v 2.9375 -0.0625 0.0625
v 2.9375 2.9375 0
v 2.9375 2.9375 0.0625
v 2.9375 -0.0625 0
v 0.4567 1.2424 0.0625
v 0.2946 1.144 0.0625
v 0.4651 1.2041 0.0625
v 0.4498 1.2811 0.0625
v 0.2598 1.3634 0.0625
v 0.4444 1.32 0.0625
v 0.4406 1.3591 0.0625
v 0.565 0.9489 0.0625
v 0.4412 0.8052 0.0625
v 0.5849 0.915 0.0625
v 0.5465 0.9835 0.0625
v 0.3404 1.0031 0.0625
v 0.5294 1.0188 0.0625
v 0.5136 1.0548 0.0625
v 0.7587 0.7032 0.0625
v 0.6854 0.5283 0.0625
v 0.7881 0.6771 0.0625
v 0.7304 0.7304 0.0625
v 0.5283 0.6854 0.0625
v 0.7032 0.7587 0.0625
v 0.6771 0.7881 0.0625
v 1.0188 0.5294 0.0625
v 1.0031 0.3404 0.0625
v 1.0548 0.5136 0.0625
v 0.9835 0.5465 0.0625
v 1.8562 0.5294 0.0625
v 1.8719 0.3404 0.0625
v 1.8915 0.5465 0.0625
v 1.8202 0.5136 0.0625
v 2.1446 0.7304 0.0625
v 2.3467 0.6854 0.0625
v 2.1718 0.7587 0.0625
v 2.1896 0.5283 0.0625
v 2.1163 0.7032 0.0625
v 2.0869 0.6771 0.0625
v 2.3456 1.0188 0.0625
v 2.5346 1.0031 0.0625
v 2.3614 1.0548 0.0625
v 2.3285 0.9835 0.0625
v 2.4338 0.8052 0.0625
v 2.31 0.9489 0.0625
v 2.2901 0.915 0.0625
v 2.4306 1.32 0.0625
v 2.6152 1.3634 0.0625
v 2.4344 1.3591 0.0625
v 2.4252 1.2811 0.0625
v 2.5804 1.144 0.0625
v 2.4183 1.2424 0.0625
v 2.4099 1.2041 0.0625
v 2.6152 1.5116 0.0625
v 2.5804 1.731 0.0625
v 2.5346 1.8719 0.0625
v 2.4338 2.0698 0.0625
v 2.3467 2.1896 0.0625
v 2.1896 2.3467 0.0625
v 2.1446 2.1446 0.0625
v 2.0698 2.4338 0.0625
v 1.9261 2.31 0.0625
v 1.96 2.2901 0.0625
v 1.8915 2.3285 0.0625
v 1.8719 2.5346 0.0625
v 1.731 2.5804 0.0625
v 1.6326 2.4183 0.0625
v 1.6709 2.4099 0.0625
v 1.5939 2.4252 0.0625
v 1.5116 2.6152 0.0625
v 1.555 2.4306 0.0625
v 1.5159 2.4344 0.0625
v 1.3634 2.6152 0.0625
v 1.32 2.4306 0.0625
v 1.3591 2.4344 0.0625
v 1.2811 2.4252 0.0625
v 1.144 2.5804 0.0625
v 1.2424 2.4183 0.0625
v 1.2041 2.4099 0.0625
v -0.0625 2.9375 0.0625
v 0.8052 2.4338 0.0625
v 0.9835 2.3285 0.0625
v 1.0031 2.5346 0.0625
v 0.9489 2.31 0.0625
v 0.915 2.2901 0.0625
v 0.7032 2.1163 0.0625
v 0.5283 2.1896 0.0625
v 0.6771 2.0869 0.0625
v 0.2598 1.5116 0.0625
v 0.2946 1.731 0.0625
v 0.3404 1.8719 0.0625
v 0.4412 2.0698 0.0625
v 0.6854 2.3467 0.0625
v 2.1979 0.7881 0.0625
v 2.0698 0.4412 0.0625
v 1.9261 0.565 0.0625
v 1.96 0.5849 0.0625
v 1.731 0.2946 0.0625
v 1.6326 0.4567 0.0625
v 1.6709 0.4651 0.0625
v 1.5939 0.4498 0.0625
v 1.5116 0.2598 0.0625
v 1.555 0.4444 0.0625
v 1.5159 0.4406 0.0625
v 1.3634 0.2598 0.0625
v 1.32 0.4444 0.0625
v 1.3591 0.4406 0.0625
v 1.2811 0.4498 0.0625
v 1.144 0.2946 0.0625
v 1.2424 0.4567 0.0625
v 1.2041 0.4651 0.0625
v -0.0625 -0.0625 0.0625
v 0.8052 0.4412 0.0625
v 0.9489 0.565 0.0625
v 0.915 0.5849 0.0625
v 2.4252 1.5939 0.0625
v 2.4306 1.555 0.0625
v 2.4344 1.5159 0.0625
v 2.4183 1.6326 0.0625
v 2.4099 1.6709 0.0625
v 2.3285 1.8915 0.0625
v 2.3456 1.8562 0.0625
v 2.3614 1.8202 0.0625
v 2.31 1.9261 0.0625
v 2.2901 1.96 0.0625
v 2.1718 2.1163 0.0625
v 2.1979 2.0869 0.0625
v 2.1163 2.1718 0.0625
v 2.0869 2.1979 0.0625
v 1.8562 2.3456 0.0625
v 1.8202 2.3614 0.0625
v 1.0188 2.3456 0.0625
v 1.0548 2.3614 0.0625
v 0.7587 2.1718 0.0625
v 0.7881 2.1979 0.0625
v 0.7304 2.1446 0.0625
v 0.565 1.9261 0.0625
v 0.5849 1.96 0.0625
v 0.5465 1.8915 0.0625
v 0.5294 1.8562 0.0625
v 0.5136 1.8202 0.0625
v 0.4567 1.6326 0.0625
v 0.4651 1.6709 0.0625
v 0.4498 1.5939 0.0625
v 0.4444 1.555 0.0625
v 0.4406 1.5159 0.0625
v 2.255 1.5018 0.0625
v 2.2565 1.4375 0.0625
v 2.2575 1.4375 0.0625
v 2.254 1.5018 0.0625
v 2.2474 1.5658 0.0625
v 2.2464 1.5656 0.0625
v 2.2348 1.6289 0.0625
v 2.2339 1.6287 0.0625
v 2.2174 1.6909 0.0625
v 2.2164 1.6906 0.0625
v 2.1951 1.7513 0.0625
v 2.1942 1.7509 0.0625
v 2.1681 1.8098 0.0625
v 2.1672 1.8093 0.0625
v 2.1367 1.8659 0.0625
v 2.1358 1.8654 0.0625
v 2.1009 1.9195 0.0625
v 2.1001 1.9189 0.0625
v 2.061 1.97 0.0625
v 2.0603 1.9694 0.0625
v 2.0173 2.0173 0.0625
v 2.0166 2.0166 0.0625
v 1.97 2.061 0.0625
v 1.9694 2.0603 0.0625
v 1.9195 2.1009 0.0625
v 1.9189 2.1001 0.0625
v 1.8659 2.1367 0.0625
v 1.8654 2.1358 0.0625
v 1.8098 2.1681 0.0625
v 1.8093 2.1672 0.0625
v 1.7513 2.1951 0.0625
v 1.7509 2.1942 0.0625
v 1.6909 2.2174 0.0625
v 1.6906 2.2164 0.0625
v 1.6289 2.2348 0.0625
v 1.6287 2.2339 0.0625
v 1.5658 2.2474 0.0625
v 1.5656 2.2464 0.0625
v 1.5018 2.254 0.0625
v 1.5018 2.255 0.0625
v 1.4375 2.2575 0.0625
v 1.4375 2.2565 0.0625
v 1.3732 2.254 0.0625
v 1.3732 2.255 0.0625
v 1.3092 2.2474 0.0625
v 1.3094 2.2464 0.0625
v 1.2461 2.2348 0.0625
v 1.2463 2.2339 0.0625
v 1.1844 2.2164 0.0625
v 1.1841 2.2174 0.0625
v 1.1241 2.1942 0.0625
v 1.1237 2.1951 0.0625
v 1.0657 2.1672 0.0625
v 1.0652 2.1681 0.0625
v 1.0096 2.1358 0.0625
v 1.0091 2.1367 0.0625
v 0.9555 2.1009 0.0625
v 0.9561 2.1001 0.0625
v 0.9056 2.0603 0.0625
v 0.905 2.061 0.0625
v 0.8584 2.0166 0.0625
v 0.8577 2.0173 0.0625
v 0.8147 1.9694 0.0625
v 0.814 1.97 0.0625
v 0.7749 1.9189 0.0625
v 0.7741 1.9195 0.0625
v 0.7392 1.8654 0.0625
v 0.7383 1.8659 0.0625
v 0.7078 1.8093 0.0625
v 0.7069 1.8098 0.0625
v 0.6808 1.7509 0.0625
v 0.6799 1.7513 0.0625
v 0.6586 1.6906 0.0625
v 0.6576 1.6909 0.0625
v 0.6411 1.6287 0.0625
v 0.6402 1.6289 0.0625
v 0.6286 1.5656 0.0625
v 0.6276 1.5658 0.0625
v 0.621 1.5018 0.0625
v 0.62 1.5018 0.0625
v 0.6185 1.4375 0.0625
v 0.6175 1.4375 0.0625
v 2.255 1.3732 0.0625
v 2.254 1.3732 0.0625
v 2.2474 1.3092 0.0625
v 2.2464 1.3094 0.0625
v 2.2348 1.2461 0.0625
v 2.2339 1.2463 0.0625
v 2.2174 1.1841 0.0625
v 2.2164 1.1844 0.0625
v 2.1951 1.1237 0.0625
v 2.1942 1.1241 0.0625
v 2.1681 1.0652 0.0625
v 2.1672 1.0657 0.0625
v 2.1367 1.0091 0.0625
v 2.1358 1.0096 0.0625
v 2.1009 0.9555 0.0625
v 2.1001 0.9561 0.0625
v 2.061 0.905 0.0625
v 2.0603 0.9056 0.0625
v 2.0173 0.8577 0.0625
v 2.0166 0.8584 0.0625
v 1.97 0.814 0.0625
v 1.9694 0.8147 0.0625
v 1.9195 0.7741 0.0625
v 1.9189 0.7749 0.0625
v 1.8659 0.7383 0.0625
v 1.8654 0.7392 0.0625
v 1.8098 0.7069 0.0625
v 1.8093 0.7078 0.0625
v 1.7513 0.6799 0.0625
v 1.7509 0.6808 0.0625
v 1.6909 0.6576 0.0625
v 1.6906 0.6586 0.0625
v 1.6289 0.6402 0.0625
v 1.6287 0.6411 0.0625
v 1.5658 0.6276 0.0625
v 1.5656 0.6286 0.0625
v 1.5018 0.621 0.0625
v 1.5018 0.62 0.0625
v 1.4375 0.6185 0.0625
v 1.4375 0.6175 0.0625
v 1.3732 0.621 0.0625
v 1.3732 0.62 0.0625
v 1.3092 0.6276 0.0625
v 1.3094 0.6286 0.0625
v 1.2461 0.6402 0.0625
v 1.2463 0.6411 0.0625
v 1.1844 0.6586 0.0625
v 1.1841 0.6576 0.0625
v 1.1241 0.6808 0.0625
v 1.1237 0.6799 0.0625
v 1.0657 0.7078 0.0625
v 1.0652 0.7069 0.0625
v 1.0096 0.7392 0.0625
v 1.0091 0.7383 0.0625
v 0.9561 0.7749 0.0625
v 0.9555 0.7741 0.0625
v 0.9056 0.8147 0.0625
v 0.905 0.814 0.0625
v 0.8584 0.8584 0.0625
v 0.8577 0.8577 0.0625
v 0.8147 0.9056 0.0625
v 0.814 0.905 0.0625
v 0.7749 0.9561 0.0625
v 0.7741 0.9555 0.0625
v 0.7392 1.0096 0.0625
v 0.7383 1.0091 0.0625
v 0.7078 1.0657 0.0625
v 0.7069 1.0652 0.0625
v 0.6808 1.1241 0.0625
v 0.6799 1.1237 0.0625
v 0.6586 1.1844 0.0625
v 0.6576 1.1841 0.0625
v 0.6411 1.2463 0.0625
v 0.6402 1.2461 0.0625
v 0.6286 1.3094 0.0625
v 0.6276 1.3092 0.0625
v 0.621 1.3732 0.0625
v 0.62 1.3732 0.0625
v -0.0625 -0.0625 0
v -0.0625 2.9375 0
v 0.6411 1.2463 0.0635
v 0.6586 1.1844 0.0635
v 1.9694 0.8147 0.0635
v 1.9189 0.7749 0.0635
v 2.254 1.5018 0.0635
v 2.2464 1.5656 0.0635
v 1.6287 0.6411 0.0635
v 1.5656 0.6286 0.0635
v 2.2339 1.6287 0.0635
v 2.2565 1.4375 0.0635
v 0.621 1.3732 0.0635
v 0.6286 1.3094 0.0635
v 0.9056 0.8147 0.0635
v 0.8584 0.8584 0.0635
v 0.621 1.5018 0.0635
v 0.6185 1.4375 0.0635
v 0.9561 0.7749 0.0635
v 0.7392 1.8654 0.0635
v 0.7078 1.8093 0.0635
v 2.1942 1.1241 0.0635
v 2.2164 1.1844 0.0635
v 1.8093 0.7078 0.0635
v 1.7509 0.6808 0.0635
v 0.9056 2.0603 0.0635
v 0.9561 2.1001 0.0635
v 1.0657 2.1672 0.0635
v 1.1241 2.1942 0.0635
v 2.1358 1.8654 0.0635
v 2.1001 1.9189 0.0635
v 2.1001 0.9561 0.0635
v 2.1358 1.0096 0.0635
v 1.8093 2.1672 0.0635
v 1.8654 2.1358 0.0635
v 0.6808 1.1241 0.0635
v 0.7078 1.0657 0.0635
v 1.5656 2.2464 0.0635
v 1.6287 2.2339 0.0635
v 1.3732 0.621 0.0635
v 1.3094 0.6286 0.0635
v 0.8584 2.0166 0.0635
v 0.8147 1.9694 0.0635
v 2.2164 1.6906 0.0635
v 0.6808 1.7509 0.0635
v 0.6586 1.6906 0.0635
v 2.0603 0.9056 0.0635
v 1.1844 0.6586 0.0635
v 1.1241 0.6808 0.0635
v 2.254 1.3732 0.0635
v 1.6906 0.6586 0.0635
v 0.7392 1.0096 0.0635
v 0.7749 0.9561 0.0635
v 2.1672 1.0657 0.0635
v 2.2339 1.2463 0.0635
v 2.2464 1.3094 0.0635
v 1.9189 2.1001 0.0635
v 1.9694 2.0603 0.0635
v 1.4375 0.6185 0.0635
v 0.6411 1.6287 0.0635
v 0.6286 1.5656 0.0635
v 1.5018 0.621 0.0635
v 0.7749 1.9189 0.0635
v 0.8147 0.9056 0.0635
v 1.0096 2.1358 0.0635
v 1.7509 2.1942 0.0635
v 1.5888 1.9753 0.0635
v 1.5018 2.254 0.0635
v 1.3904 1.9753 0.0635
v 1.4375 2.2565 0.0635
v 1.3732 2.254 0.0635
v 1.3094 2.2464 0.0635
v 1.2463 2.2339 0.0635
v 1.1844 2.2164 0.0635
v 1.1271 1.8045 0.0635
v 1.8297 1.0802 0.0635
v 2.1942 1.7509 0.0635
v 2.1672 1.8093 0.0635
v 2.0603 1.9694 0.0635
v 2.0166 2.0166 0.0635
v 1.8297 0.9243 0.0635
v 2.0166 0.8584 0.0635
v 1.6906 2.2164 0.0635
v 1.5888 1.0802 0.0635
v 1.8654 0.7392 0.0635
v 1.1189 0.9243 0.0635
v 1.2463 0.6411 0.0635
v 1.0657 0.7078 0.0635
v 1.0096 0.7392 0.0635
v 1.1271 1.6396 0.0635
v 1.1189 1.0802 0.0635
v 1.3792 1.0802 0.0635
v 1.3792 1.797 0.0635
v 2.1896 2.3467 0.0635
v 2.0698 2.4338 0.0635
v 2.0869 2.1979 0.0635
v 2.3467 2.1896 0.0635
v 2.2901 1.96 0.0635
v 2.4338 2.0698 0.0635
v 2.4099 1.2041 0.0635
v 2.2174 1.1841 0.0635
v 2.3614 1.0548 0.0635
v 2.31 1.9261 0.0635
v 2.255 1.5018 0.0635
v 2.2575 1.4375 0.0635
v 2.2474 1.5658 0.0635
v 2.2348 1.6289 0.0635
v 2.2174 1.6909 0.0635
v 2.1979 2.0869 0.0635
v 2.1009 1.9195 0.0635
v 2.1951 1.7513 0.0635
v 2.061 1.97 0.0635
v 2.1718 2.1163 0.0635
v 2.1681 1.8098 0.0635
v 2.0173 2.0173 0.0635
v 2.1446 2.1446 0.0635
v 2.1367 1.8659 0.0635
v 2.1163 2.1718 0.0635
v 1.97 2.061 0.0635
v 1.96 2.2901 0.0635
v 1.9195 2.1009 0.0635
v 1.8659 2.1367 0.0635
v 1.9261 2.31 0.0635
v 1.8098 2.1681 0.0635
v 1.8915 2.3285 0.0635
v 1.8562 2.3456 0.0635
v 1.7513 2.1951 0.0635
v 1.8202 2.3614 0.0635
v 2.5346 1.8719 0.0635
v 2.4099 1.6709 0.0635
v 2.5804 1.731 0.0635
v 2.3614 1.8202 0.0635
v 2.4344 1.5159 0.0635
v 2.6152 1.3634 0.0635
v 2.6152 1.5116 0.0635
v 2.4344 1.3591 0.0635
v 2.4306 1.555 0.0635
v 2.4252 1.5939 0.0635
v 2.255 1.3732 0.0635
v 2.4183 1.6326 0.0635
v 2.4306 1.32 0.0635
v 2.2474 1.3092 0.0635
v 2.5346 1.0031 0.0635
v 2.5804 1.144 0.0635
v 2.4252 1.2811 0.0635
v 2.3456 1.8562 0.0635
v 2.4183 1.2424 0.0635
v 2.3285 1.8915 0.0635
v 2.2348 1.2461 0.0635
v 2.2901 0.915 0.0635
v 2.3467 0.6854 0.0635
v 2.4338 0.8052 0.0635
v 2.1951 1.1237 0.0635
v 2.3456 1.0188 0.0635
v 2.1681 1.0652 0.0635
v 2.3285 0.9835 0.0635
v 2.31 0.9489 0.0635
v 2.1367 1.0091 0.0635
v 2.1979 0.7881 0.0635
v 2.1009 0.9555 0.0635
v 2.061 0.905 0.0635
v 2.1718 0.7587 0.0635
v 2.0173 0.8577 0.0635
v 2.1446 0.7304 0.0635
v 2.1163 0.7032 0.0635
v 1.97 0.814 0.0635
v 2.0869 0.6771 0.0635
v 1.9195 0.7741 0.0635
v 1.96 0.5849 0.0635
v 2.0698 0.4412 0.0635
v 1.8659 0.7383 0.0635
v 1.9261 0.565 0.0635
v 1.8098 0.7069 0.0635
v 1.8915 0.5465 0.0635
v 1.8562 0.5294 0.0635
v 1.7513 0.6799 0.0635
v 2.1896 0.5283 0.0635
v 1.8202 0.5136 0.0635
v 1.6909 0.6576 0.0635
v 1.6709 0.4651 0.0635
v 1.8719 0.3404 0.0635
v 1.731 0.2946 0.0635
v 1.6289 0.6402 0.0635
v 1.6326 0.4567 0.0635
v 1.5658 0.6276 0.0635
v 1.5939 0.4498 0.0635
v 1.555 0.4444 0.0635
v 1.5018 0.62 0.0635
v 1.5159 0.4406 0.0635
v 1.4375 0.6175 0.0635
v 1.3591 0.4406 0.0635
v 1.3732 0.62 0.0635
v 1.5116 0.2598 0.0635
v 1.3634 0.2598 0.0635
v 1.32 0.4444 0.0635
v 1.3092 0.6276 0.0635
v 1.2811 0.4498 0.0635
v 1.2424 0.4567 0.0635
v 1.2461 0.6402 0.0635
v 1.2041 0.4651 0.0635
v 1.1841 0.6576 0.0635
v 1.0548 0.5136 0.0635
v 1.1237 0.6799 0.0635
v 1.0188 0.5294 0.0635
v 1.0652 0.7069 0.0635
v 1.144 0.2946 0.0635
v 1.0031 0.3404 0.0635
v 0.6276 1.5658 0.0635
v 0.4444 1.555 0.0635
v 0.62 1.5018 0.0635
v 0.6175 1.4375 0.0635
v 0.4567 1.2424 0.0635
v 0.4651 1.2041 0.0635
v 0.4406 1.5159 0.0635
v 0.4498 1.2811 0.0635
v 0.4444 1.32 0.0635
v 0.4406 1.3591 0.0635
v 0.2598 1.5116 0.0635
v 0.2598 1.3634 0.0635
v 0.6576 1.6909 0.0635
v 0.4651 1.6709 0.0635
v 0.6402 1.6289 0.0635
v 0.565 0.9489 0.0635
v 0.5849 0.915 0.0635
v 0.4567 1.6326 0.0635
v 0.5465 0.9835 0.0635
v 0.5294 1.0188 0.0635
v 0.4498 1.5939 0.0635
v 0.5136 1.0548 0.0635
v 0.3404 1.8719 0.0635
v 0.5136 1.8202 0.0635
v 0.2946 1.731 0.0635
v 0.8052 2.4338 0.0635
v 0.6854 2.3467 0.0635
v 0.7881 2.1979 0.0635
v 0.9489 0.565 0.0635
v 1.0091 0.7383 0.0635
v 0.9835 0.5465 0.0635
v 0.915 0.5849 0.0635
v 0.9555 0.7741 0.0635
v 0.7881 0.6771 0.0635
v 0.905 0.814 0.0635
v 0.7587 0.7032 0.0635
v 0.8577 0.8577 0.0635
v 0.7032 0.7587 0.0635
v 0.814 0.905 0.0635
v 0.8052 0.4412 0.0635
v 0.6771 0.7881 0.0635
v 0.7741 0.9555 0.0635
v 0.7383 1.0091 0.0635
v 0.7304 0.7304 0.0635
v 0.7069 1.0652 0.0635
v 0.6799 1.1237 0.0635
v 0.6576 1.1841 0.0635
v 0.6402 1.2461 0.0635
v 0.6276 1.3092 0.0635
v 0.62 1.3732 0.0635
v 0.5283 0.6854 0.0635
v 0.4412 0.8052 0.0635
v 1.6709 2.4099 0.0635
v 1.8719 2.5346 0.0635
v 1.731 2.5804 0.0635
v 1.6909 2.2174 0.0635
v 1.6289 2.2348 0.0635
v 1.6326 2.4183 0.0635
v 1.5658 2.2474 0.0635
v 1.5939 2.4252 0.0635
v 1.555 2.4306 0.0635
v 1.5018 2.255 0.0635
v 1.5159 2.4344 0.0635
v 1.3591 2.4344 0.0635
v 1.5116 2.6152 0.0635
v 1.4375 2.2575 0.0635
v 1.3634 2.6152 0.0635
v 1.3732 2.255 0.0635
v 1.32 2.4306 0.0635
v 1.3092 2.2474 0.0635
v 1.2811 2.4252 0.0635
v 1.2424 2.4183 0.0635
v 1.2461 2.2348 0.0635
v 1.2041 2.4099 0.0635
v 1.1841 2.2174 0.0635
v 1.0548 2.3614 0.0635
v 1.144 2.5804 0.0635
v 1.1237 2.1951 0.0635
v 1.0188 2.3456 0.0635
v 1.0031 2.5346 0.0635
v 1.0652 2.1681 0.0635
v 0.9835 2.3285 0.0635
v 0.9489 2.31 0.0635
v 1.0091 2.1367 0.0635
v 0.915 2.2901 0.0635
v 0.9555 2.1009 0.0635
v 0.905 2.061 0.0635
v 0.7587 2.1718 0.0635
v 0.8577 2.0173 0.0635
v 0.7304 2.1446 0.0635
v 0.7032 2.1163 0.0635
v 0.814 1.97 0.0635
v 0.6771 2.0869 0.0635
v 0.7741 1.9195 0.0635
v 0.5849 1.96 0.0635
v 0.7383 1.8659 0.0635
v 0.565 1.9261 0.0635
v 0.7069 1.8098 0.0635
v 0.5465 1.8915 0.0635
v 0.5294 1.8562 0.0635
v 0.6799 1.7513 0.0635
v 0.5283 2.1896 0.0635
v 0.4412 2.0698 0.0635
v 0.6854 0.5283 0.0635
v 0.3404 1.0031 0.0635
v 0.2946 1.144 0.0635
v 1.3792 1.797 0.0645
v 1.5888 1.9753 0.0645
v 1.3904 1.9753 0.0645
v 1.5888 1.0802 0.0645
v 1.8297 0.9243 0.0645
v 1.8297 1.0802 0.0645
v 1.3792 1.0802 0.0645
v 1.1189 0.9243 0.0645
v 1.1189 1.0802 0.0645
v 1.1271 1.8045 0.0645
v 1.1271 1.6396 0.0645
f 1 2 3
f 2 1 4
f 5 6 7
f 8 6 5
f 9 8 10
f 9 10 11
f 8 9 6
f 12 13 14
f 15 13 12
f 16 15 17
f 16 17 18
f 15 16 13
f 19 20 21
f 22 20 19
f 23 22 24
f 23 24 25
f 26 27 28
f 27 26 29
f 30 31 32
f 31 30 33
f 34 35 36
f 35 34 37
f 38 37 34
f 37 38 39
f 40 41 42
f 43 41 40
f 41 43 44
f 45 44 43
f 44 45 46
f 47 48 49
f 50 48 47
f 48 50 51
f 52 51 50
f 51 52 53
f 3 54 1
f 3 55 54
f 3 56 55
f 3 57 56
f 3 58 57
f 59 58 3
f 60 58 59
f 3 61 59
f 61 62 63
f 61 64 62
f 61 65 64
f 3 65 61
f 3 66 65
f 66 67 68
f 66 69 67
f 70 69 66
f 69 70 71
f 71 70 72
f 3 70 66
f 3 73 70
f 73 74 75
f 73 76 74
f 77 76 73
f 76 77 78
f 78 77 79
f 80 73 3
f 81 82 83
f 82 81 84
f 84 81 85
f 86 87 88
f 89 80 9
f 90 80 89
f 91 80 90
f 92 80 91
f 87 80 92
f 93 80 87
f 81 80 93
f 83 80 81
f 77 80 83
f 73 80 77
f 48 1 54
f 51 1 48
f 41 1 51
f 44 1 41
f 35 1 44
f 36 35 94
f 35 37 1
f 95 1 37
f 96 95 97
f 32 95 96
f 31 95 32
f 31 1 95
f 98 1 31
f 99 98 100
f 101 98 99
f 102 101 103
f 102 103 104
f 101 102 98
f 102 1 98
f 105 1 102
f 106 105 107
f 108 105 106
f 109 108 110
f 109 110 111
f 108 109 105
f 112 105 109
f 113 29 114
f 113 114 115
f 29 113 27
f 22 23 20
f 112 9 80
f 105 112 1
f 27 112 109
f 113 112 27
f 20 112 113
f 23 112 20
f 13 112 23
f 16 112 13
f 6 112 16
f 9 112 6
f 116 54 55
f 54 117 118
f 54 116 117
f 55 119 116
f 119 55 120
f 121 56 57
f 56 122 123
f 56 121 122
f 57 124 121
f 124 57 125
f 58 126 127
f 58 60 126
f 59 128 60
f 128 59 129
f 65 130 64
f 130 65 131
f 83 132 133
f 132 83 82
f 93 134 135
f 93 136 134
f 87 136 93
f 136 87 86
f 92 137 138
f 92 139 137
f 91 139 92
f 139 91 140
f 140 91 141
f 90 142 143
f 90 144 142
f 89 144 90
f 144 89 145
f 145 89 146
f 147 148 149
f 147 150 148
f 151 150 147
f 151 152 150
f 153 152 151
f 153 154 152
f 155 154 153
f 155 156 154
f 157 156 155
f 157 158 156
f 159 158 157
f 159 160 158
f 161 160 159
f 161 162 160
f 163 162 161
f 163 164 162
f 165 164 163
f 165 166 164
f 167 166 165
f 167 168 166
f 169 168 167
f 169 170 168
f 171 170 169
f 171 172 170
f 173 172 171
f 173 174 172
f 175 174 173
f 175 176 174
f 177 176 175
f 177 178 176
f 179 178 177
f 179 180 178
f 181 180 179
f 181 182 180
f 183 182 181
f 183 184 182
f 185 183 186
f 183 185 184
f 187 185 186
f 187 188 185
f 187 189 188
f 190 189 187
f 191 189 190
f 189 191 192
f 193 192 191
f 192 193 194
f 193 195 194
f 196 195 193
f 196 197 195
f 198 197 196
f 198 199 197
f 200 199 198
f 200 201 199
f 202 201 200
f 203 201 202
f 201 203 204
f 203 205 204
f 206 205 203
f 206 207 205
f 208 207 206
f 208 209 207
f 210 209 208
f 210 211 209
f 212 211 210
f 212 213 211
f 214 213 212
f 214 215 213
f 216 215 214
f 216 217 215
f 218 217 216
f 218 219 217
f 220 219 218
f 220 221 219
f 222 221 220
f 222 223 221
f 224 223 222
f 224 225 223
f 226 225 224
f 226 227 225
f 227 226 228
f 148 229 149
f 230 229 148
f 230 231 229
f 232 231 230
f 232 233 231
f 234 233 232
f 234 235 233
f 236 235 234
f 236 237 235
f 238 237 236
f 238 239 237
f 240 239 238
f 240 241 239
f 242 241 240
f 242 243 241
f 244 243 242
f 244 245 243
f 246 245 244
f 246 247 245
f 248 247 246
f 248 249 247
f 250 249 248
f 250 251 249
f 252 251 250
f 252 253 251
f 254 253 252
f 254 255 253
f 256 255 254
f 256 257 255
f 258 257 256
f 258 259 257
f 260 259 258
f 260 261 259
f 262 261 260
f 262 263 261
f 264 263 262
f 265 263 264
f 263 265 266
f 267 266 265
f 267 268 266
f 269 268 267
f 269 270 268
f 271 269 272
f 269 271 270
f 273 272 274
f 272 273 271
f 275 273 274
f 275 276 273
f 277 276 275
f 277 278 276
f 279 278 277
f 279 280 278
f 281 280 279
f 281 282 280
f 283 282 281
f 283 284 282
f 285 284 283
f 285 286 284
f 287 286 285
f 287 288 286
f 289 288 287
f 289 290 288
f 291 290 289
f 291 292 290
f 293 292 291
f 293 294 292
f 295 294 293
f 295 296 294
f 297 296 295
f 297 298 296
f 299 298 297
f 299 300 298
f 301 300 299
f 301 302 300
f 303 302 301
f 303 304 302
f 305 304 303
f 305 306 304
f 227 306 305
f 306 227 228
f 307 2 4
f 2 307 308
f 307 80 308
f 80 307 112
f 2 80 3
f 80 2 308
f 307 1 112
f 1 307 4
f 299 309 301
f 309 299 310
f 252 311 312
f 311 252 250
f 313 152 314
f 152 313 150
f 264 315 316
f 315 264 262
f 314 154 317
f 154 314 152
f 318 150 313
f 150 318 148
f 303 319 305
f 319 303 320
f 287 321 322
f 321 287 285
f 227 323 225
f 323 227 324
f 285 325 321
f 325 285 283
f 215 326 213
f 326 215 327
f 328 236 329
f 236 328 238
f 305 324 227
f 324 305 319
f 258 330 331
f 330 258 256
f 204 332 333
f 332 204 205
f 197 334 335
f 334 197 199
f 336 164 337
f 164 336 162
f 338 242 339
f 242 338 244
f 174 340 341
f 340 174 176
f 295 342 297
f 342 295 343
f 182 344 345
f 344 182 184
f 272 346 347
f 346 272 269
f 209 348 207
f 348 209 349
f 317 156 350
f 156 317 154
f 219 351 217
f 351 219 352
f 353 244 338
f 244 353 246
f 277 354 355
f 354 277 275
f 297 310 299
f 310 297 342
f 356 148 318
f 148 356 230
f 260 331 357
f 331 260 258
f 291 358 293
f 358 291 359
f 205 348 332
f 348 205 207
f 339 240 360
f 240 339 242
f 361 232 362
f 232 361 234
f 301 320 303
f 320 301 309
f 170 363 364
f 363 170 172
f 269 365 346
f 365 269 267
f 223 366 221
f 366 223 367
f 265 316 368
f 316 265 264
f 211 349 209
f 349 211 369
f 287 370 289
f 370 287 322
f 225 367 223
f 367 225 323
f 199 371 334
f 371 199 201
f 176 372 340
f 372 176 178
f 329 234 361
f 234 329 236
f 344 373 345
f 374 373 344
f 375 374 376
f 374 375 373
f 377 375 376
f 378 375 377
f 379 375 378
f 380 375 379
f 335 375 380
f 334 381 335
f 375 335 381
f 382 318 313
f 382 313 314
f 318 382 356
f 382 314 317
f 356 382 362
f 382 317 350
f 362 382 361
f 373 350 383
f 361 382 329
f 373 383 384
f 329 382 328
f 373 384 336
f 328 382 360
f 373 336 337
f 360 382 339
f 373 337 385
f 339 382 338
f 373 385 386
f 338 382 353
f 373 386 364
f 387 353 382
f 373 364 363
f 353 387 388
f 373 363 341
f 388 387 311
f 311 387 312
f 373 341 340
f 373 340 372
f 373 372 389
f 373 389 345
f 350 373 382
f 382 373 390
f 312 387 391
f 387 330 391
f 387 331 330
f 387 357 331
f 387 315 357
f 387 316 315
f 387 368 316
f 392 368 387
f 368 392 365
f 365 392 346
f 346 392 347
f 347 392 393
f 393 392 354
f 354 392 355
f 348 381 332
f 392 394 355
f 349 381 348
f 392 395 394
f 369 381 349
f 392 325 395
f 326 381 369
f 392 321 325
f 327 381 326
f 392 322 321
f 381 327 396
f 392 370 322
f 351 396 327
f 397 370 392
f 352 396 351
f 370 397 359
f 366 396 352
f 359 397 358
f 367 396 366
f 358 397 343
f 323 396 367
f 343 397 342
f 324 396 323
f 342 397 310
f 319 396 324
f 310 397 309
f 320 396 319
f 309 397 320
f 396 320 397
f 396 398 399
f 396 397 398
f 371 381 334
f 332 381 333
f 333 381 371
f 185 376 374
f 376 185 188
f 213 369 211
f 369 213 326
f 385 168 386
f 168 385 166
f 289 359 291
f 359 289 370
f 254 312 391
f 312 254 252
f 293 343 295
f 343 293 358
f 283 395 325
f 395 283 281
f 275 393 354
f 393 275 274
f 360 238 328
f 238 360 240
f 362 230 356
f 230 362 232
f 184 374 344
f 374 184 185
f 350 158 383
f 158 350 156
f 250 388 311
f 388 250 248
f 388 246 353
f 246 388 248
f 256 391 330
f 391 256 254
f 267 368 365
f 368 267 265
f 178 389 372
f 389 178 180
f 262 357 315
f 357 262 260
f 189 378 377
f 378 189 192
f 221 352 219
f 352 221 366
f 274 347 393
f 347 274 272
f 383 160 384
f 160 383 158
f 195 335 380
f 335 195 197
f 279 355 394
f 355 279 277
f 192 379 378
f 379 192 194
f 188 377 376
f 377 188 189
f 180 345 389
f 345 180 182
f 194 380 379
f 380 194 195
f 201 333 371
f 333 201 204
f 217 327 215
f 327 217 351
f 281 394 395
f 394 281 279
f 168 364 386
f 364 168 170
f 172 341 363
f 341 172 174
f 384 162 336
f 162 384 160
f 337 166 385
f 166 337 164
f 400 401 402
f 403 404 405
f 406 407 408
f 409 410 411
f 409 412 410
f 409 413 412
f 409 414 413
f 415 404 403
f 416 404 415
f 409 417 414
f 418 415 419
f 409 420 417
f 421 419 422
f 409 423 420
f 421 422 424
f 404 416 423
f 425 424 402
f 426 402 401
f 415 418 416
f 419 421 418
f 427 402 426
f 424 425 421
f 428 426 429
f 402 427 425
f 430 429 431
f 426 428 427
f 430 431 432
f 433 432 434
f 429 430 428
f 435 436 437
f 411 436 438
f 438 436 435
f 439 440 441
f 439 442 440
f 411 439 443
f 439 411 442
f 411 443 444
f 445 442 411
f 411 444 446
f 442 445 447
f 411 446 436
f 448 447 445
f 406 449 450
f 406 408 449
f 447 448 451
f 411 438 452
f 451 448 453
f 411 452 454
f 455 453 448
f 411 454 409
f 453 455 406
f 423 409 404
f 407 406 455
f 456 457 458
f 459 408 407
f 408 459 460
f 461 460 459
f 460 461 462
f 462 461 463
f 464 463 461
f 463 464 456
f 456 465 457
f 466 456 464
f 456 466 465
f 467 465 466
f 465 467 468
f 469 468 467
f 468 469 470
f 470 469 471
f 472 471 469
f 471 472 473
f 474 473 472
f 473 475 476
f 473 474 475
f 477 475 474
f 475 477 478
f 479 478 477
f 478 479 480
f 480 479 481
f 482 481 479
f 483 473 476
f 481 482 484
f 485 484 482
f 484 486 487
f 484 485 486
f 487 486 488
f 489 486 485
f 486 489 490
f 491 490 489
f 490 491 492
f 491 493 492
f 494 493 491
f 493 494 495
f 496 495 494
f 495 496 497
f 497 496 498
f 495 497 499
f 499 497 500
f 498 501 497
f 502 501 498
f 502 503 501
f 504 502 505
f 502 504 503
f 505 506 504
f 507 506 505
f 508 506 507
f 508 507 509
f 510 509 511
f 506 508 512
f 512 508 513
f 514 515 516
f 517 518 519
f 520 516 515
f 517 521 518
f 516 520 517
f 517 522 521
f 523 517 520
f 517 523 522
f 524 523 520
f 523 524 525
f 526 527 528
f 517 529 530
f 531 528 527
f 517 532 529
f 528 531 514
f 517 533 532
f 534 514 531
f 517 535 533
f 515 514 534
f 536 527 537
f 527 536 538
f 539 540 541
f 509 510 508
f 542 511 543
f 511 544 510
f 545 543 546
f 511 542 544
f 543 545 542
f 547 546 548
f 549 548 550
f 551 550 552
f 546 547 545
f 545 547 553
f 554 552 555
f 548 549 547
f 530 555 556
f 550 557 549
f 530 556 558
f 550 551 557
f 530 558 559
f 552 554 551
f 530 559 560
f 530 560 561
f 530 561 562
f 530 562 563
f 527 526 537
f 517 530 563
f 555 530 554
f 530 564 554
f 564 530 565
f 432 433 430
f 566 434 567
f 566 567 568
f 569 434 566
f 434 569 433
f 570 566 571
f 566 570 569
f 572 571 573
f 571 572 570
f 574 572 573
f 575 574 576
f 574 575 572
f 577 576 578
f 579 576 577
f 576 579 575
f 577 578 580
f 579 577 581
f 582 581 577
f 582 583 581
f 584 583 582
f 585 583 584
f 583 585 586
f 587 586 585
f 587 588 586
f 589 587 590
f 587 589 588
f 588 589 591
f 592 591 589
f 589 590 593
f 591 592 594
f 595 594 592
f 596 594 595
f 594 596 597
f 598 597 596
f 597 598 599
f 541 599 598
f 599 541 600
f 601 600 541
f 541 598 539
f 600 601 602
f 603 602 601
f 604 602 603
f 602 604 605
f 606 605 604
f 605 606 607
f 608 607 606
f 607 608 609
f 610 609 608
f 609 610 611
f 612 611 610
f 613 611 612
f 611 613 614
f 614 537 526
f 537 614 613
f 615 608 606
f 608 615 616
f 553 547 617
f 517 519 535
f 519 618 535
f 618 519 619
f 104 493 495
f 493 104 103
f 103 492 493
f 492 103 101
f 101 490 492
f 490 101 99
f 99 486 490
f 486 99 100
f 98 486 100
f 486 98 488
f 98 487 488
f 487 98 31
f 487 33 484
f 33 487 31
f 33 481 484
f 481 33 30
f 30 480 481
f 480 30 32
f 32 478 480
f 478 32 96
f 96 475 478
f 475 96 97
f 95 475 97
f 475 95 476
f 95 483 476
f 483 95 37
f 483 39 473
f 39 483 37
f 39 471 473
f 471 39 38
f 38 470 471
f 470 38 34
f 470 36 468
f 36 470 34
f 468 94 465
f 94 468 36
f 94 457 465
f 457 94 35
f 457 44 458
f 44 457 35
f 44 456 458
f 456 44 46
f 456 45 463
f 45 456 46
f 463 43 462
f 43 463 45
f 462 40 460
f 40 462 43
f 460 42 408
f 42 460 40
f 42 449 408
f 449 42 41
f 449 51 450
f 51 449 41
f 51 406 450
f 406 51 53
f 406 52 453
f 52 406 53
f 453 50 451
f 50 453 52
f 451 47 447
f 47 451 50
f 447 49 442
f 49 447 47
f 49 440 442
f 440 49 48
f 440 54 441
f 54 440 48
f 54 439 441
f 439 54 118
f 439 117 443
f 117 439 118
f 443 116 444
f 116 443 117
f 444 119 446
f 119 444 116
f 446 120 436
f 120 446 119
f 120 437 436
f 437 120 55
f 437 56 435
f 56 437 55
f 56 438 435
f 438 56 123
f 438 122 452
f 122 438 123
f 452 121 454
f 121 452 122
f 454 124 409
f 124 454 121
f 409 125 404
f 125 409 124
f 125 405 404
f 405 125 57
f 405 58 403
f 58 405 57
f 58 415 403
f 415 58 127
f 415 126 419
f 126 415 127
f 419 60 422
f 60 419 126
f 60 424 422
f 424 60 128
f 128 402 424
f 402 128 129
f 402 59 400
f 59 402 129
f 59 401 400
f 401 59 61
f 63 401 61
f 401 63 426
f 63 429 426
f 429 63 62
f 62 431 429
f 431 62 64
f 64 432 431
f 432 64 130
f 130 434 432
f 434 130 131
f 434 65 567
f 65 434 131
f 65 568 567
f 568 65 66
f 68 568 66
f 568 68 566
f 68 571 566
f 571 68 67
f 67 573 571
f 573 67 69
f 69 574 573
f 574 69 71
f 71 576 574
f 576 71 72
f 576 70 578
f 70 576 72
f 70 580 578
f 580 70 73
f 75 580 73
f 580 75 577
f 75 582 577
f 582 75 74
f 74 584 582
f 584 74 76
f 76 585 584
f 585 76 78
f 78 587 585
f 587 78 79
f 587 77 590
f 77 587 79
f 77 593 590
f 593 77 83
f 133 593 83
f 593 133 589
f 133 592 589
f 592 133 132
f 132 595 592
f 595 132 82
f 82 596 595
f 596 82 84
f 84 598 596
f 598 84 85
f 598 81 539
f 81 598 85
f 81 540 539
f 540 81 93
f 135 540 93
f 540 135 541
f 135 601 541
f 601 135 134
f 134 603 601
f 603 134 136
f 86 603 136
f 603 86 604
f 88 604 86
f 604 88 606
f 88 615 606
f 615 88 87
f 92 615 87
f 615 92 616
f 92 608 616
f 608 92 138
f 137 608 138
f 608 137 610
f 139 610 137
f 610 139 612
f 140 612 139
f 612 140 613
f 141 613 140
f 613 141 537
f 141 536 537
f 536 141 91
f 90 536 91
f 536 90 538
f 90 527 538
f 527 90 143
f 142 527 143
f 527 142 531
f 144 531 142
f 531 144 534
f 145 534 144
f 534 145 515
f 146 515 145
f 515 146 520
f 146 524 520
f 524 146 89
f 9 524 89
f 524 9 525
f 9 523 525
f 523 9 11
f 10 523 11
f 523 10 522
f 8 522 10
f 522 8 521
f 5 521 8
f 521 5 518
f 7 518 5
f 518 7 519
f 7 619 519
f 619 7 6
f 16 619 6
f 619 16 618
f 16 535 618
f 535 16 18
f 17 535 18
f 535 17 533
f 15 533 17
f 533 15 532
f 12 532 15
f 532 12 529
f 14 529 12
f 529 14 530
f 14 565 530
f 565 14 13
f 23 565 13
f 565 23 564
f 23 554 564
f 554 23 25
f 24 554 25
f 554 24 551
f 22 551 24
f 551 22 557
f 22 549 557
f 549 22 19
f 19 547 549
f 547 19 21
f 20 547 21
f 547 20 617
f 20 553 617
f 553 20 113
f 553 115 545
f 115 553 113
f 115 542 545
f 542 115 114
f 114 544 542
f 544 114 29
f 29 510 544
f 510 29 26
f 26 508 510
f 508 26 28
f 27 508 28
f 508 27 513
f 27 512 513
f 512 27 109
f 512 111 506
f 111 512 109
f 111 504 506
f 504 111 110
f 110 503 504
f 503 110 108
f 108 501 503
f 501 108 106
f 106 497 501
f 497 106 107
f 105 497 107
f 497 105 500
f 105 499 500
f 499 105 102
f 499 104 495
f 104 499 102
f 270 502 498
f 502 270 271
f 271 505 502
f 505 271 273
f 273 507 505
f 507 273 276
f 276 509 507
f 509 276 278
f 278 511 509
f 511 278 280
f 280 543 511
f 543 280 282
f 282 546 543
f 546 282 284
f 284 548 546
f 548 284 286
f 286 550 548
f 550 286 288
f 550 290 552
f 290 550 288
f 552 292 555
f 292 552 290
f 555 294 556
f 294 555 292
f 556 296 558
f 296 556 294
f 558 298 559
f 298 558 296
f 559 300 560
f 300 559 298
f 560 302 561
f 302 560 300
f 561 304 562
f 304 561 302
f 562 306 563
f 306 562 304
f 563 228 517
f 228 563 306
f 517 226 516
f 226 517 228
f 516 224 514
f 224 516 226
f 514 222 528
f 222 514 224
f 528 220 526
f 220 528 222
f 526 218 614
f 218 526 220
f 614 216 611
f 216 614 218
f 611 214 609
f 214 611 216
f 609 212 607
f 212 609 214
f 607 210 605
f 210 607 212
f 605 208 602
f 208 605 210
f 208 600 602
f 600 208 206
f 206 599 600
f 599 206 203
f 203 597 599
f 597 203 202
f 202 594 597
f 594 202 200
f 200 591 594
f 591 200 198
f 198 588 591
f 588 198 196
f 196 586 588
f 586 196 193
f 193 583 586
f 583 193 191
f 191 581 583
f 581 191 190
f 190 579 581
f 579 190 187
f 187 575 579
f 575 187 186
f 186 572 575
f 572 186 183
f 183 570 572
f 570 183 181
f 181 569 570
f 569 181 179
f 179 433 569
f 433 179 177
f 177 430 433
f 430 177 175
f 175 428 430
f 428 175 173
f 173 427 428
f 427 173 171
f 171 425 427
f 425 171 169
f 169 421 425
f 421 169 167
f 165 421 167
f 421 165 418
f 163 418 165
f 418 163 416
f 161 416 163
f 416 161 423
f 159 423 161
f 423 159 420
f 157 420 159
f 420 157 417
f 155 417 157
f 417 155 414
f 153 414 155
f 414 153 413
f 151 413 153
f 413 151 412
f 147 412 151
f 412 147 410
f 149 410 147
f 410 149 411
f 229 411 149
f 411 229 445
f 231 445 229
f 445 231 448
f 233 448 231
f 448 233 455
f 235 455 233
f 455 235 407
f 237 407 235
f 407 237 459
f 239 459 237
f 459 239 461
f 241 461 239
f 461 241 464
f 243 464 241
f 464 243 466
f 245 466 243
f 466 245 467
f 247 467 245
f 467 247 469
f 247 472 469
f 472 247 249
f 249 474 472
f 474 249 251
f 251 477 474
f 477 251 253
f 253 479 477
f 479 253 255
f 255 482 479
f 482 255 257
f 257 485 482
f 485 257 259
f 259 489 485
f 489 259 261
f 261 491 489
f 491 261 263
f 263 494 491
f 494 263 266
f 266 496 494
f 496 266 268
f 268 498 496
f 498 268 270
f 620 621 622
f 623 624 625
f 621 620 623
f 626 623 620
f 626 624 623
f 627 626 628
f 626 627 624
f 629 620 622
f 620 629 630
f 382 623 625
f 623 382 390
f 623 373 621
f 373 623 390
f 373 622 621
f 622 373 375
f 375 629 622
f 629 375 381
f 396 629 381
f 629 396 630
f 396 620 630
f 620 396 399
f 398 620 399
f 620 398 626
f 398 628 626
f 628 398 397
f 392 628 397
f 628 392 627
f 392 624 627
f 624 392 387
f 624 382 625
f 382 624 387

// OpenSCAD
// element110-1.scad
// Gear tile variant — number "1" in the bore.

plate_w = 2 + 7/8;
plate_d = 2 + 7/8;
plate_h = 1/16;
frame_w = 1/16;

hole_d = 3/32;
hole_r = hole_d / 2;

gear_n      = 20;
gear_r_tip  = 1.18;
gear_r_root = 1.00;
gear_r_bore = 0.82;
tooth_hw    = 4.5;
tooth_tip_f = 0.80;

module rivet_holes() {
    spacing_x = plate_w / 10;
    spacing_y = plate_d / 10;
    inset_x   = spacing_x / 2;
    inset_y   = spacing_y / 2;
    for (i = [0:9]) translate([inset_x + i * spacing_x, inset_y,           -1]) cylinder(h = plate_h + 2, r = hole_r, $fn = 20);
    for (i = [0:9]) translate([inset_x + i * spacing_x, plate_d - inset_y, -1]) cylinder(h = plate_h + 2, r = hole_r, $fn = 20);
    for (i = [0:9]) translate([inset_x,           inset_y + i * spacing_y, -1]) cylinder(h = plate_h + 2, r = hole_r, $fn = 20);
    for (i = [0:9]) translate([plate_w - inset_x, inset_y + i * spacing_y, -1]) cylinder(h = plate_h + 2, r = hole_r, $fn = 20);
}

module frame() {
    color("black")
    difference() {
        translate([-frame_w, -frame_w, 0]) cube([plate_w + 2 * frame_w, plate_d + 2 * frame_w, plate_h]);
        translate([0, 0, -0.001])          cube([plate_w, plate_d, plate_h + 0.002]);
    }
}

module plate() {
    difference() {
        color("darkgray") cube([plate_w, plate_d, plate_h]);
        rivet_holes();
    }
}

rivet_h = plate_h;
module rivets() {
    spacing_x = plate_w / 10;
    spacing_y = plate_d / 10;
    inset_x   = spacing_x / 2;
    inset_y   = spacing_y / 2;
    color("lightgray") {
        for (i = [0:9]) translate([inset_x + i * spacing_x, inset_y,           0]) cylinder(h = rivet_h, r = hole_r, $fn = 20);
        for (i = [0:9]) translate([inset_x + i * spacing_x, plate_d - inset_y, 0]) cylinder(h = rivet_h, r = hole_r, $fn = 20);
        for (i = [0:9]) translate([inset_x,           inset_y + i * spacing_y, 0]) cylinder(h = rivet_h, r = hole_r, $fn = 20);
        for (i = [0:9]) translate([plate_w - inset_x, inset_y + i * spacing_y, 0]) cylinder(h = rivet_h, r = hole_r, $fn = 20);
    }
}

module gear_tooth_2d() {
    polygon([
        [gear_r_root * cos(-tooth_hw),               gear_r_root * sin(-tooth_hw)],
        [gear_r_tip  * cos(-tooth_hw * tooth_tip_f),  gear_r_tip  * sin(-tooth_hw * tooth_tip_f)],
        [gear_r_tip  * cos( tooth_hw * tooth_tip_f),  gear_r_tip  * sin( tooth_hw * tooth_tip_f)],
        [gear_r_root * cos( tooth_hw),               gear_r_root * sin( tooth_hw)],
    ]);
}

module gear_2d() {
    pitch = 360 / gear_n;
    union() {
        circle(r = gear_r_root, $fn = gear_n * 8);
        for (i = [0:gear_n - 1]) rotate([0, 0, i * pitch]) gear_tooth_2d();
    }
}

module gear() {
    color("black")
    translate([plate_w / 2, plate_d / 2, +0.001])
    linear_extrude(plate_h)
    difference() { gear_2d(); circle(r = gear_r_bore, $fn = 80); }
}

module gear_bore() {
    color([0.80, 0.80, 0.80])
    translate([plate_w / 2, plate_d / 2, 0])
    linear_extrude(plate_h + 0.001)
    circle(r = gear_r_bore - 0.001, $fn = 80);
}

frame();
plate();
rivets();
gear_bore();
gear();

module gear_label() {
    color("green")
    translate([plate_w / 2, plate_d / 2, 0])
    linear_extrude(plate_h + 0.002)
    text("1", size = 1.1, halign = "center", valign = "center",
         font = "Liberation Sans:style=Bold");
}

gear_label();
